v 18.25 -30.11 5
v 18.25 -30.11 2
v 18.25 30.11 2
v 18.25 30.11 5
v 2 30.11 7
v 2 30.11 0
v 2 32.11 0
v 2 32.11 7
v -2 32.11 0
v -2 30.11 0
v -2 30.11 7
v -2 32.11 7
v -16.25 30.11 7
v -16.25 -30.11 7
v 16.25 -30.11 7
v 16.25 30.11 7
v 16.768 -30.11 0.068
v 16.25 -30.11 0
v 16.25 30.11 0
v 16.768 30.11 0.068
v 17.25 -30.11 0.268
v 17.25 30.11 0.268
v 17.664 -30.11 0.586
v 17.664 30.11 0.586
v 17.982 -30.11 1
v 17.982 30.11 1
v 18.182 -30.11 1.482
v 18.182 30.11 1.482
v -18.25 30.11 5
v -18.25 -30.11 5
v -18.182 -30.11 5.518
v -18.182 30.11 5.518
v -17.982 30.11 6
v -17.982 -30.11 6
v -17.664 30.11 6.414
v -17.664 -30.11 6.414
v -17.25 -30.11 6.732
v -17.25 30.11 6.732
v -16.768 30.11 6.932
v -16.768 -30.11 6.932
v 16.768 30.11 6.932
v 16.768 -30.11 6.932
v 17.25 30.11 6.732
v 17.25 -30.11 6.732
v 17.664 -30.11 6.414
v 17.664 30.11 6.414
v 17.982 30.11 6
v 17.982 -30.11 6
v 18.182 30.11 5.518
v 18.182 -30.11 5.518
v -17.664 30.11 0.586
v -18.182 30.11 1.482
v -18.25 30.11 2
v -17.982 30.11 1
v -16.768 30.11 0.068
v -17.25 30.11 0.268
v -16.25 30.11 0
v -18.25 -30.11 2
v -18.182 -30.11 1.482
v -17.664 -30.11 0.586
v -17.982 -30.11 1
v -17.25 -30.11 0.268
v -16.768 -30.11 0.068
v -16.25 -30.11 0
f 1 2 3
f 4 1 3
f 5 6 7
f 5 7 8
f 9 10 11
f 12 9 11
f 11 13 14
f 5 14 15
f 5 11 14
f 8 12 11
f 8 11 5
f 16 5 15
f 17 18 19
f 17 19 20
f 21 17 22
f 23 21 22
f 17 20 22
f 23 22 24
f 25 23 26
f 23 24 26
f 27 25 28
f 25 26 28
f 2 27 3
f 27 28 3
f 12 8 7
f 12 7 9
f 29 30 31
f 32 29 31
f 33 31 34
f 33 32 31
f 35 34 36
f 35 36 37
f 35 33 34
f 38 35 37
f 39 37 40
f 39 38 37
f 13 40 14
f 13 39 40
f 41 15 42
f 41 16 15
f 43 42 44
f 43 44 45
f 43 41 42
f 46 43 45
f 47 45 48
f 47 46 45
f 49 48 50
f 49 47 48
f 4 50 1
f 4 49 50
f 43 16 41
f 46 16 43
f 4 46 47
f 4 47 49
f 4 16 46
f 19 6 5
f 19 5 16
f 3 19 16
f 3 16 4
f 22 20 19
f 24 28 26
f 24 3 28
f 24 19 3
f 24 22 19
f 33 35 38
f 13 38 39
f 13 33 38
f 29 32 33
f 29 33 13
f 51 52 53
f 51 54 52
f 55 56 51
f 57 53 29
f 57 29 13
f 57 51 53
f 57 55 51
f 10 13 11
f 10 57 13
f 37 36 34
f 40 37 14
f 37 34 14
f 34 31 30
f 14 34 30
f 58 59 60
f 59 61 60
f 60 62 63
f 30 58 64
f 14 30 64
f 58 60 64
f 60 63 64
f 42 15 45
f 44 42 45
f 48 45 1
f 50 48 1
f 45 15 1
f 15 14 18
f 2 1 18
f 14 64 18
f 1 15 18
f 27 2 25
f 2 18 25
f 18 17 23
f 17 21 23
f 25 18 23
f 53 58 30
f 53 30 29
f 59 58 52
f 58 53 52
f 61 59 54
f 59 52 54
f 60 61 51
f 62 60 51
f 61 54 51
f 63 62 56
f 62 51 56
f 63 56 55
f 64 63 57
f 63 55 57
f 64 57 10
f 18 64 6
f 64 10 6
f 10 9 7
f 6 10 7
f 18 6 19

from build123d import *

# Parameters (mm, degrees)
F0_W     = 36.5
F0_H     = 60.22
F1_DEPTH = 7
F2_W     = 4
F2_H     = 7
F3_DEPTH = 2
F4_R     = 2


with BuildPart() as f1:
    # F0 (on Top) → F1 (new body)
    with BuildSketch(Plane.XY):
        Rectangle(F0_W, F0_H)
    extrude(amount=F1_DEPTH)

    # F2 (on face) → F3 (join)
    with BuildSketch(Plane(origin=(0, 30.11, 0), x_dir=(-1, 0, 0), z_dir=(0, 1, 0))):
        with Locations((0, 3.5)):
            Rectangle(F2_W, F2_H)
    extrude(amount=F3_DEPTH)

    # F4
    f4_edges = [f1.edges().sort_by_distance(p)[0] for p in [
        (18.25, 0, 7),
        (18.25, 0, 0),
        (-18.25, 0, 7),
        (-18.25, 0, 0),
    ]]
    fillet(f4_edges, radius=F4_R)


solid = f1.part
